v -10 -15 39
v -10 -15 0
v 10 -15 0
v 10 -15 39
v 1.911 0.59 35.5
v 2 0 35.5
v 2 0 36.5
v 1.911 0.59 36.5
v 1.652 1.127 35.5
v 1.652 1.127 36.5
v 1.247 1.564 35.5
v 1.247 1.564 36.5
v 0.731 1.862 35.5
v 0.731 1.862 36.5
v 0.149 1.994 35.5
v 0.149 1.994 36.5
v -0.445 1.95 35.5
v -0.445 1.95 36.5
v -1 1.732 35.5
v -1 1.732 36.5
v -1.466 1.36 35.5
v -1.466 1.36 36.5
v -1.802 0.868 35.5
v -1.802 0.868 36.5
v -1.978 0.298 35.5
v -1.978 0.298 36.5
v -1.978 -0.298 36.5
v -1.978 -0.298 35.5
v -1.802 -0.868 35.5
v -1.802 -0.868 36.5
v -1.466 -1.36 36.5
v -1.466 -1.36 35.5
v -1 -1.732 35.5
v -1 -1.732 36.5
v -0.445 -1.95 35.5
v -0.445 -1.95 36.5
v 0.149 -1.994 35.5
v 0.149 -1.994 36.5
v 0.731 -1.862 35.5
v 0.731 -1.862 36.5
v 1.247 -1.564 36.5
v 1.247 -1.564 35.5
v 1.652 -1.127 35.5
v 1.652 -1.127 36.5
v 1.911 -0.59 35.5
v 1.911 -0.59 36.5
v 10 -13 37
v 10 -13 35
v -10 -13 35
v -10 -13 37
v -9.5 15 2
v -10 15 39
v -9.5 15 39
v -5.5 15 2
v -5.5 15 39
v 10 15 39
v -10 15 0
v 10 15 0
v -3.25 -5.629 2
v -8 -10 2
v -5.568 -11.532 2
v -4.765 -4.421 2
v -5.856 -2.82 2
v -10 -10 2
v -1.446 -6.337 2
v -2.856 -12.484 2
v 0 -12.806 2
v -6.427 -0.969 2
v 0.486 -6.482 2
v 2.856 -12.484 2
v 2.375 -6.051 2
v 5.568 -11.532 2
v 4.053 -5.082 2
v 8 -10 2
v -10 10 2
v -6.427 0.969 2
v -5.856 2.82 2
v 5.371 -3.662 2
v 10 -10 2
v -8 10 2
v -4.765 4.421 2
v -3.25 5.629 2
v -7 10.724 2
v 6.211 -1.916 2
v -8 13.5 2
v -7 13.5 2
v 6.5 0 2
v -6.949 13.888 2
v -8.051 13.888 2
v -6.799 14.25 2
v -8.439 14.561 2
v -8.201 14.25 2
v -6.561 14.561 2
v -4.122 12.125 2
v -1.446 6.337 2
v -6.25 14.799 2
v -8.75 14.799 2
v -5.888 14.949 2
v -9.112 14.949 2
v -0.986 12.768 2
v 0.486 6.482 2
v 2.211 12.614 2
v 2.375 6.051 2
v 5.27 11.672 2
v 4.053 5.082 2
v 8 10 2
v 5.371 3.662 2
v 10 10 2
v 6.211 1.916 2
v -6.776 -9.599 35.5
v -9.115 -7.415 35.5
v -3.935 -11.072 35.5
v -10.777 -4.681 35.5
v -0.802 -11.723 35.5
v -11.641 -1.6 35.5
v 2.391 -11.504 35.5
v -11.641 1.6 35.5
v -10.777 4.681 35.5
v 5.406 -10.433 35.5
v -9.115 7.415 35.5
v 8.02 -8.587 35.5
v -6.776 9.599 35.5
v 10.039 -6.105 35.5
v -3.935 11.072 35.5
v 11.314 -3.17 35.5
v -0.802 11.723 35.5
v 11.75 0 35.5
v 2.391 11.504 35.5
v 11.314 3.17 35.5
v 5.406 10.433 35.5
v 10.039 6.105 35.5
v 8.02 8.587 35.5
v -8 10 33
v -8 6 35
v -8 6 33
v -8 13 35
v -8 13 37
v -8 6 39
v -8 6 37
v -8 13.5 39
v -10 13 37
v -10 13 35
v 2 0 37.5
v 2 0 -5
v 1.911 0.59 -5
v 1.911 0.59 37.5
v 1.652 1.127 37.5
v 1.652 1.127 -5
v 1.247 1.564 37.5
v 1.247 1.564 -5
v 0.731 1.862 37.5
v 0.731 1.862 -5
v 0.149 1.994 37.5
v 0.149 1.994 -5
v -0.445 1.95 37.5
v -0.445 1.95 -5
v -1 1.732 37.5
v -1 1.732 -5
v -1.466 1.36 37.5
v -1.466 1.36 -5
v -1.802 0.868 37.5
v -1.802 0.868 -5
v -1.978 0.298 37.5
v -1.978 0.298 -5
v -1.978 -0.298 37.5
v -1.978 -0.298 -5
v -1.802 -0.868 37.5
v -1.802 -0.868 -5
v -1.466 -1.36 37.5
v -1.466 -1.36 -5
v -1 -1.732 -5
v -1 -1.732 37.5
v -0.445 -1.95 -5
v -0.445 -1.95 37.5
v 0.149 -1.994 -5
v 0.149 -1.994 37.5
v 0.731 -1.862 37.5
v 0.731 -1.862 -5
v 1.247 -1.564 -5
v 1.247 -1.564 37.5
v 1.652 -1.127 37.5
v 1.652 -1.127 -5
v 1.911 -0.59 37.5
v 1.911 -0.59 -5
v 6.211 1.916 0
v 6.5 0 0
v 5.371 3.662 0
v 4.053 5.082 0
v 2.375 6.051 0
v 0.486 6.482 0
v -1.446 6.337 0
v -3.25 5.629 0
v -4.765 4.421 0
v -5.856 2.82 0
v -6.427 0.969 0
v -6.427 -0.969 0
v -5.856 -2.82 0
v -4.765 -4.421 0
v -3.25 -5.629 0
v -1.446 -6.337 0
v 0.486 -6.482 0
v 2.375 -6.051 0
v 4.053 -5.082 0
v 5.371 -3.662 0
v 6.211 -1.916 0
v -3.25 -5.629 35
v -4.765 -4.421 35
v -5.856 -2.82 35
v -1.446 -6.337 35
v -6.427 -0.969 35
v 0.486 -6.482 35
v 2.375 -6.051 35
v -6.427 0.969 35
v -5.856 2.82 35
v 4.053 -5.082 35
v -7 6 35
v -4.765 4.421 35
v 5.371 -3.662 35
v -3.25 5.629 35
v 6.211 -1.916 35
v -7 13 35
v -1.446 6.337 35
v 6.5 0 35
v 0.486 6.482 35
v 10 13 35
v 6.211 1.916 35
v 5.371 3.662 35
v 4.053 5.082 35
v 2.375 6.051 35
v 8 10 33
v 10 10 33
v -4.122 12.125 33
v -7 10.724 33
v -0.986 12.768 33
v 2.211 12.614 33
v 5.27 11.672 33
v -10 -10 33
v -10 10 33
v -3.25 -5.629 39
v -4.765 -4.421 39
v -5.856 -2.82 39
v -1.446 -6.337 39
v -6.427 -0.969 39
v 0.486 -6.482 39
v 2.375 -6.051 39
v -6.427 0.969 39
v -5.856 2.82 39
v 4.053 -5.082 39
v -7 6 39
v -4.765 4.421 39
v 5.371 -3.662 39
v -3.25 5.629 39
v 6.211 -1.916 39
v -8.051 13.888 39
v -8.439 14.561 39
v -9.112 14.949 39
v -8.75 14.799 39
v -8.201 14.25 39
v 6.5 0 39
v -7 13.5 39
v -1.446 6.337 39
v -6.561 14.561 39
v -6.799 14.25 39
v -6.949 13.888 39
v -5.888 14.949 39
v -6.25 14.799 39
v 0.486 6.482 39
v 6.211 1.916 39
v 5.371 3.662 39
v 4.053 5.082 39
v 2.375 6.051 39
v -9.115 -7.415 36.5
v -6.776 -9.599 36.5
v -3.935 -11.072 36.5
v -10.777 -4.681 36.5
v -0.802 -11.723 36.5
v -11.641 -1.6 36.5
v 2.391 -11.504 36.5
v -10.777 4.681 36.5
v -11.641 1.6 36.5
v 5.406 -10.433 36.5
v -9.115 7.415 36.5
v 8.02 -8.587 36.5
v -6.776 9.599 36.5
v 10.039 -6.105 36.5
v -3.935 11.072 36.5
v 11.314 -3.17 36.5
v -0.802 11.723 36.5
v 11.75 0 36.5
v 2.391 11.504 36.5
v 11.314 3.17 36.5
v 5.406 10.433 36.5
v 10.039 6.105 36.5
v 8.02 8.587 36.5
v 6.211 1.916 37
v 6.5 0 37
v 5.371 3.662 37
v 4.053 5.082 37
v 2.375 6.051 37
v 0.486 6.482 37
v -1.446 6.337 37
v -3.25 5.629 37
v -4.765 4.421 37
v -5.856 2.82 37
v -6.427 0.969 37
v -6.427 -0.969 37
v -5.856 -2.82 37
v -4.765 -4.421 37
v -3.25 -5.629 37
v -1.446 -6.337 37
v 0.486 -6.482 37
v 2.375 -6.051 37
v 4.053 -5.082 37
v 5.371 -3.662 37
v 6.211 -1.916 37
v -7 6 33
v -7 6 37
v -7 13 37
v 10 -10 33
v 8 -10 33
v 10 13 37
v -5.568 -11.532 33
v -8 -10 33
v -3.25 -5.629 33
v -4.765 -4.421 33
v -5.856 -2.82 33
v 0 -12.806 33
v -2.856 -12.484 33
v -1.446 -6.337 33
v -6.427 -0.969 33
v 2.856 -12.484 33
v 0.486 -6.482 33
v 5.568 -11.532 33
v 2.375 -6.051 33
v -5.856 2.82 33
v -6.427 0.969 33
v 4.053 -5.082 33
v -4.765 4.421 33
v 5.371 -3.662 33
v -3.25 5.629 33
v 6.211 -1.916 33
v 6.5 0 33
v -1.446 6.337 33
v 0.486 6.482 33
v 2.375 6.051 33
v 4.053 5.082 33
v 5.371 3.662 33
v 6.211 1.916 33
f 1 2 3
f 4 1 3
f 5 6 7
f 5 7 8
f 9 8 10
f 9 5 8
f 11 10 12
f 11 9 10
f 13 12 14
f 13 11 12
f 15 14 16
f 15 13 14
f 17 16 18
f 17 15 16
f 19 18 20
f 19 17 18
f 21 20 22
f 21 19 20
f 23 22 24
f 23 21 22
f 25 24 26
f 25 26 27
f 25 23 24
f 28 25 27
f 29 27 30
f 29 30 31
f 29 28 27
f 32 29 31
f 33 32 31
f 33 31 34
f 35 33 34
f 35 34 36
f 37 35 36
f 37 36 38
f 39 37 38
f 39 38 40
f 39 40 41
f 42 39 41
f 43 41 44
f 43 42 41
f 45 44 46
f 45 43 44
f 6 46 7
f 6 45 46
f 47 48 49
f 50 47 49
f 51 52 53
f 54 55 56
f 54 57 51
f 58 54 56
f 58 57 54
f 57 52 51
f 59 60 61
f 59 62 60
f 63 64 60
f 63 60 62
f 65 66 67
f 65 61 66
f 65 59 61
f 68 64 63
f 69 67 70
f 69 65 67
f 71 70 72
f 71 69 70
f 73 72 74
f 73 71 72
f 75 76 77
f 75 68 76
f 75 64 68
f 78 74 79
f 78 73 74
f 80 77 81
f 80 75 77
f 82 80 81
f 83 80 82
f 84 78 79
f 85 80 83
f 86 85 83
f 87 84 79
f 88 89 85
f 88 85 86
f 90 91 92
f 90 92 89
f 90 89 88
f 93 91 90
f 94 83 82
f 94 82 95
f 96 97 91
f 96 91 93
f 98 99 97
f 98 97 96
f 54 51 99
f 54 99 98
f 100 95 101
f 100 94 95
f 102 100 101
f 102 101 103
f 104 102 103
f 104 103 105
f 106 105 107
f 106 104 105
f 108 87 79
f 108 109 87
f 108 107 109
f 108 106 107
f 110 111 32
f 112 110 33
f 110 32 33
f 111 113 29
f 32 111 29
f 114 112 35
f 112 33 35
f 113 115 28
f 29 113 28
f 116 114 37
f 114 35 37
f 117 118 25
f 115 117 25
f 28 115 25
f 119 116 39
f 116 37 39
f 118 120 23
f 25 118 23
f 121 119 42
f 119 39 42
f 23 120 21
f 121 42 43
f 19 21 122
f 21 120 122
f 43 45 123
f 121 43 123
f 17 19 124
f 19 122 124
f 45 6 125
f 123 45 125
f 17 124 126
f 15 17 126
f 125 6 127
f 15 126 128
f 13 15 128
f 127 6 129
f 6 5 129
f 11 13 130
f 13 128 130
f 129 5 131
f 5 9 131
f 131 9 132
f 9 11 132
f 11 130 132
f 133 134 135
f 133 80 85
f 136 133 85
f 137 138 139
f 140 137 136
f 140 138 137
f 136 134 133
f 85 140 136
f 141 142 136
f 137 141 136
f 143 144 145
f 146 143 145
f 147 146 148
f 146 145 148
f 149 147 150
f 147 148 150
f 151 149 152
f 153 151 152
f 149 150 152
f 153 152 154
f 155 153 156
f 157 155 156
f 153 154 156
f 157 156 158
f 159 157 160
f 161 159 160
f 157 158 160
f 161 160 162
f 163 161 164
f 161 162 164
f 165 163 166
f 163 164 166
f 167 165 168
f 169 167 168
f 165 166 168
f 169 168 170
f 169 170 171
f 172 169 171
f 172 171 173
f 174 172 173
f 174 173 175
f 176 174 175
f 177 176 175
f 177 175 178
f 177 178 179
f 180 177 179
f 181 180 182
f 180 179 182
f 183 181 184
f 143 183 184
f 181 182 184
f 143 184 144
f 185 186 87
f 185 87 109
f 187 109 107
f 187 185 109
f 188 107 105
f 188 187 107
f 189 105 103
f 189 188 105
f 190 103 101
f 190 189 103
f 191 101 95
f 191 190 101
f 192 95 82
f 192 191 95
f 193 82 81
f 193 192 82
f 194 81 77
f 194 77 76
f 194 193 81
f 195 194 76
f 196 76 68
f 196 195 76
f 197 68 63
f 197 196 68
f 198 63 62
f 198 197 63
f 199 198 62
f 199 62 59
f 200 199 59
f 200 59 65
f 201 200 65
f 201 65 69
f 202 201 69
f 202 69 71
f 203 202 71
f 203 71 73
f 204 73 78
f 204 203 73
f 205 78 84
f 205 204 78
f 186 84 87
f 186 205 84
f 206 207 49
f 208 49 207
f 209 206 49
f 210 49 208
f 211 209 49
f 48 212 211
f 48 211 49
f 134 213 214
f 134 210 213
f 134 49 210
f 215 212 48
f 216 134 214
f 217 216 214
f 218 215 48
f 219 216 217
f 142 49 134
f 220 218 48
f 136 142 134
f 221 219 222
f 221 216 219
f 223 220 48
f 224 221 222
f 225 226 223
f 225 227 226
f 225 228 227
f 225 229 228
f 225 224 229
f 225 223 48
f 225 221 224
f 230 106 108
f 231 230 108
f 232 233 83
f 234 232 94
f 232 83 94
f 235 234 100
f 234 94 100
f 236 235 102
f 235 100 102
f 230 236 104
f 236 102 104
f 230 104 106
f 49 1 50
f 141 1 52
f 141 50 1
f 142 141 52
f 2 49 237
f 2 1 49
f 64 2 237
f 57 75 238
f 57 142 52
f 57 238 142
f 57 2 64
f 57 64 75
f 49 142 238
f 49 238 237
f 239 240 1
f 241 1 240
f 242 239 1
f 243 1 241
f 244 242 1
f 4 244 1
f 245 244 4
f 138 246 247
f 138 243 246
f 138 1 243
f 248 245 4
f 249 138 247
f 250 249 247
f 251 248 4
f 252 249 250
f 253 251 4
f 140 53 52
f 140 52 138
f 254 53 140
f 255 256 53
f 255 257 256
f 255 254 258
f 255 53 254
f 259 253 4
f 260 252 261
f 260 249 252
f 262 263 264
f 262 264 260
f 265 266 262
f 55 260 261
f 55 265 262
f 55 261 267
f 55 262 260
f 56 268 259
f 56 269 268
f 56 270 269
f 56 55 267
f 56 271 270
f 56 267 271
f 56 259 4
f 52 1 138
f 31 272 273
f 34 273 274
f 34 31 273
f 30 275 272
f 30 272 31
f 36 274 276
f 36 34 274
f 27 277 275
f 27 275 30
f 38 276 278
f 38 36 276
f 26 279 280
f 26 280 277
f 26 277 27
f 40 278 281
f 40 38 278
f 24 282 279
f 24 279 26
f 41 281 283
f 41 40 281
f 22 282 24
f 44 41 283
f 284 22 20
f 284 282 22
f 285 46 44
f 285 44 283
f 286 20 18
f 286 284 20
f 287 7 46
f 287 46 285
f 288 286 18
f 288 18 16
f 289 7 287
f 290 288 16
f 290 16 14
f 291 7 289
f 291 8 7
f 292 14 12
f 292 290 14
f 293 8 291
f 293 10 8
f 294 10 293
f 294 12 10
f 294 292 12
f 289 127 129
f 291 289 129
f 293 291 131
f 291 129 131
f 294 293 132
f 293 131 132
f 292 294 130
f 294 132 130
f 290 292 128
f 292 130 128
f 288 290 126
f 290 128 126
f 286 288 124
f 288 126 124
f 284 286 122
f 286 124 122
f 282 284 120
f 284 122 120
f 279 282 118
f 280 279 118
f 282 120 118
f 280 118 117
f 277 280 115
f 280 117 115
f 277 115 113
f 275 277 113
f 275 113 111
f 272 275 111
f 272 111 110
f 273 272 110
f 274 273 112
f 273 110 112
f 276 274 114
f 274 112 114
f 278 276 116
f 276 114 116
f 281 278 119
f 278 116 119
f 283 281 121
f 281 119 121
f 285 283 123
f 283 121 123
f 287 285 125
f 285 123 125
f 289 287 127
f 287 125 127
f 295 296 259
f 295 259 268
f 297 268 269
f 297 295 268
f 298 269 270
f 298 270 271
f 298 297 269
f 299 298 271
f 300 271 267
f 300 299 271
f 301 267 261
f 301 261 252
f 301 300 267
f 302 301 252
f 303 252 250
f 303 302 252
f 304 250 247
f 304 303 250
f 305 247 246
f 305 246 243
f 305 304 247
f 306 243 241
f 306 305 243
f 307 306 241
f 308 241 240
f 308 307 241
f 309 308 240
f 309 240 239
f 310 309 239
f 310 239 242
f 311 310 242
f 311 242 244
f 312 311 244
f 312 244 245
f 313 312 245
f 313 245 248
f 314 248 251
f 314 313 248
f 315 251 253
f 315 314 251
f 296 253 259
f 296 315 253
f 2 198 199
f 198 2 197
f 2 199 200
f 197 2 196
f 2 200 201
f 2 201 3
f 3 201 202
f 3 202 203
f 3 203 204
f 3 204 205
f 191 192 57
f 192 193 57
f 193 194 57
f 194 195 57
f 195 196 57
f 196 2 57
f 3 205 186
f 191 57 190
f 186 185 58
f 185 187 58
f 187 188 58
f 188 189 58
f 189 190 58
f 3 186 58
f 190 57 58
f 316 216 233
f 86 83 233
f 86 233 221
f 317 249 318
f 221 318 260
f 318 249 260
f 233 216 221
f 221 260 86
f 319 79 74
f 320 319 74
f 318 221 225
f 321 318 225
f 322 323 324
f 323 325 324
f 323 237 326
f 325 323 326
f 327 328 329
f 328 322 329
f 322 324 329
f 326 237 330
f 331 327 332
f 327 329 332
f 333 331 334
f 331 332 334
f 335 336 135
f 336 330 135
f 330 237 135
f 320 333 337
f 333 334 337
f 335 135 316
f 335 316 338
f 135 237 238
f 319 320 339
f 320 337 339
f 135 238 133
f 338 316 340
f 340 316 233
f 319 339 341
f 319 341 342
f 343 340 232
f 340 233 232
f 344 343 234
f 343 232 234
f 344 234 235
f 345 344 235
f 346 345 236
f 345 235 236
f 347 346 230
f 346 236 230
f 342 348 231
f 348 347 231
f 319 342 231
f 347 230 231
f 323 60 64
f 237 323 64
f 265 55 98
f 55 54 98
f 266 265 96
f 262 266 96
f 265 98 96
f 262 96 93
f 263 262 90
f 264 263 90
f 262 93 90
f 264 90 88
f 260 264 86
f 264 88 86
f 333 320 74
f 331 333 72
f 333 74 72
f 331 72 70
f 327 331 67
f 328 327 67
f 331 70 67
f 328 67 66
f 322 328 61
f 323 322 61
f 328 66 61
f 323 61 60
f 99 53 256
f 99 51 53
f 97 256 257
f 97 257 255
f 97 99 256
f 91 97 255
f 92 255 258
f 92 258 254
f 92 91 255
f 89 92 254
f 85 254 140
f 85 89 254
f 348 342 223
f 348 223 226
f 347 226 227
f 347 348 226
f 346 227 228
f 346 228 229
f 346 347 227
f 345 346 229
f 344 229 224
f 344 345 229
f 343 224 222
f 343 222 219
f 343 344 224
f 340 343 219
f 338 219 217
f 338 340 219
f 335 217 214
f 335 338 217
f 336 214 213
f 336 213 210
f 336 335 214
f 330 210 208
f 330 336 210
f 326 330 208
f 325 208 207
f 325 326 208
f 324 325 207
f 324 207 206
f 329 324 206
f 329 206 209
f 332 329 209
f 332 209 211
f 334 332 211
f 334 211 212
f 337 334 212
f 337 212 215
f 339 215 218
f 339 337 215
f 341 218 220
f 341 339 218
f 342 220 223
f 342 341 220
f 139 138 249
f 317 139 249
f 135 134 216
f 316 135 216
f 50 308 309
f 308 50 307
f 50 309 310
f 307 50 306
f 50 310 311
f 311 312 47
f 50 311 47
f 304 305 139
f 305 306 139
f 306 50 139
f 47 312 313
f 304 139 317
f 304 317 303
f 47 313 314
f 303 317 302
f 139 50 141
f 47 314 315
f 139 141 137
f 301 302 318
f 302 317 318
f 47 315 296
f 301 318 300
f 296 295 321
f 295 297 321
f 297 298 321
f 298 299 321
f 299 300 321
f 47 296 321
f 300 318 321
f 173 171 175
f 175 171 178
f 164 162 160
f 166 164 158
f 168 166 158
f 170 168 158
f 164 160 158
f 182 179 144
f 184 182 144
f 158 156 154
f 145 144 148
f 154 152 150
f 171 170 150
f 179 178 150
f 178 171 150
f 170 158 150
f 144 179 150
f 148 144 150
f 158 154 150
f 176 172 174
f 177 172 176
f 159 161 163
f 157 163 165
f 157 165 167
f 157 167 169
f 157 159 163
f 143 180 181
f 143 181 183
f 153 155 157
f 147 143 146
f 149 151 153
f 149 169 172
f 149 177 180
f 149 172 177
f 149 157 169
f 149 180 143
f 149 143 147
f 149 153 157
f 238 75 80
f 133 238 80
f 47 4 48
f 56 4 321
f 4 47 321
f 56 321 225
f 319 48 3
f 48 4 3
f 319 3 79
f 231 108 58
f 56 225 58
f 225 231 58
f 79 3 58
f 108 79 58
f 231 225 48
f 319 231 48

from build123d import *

# Parameters (mm, degrees)
SKETCH1_W               = 20
SKETCH1_H               = 30
SKETCH1_R               = 6.5
BOSS_EXTRUDE1_DEPTH     = 2
BOSS_EXTRUDE4_DEPTH     = 34
BOSS_EXTRUDE5_START     = 37
SKETCH1_9_W             = 20
SKETCH1_9_H             = 30
SKETCH1_9_R             = 6.5
BOSS_EXTRUDE5_DEPTH     = 2
BOSS_EXTRUDE6_START     = 33
BOSS_EXTRUDE6_OUTLINE_W = 20
BOSS_EXTRUDE6_OUTLINE_H = 30
BOSS_EXTRUDE6_OUTLINE_R = 6.5
BOSS_EXTRUDE6_DEPTH     = 2
BOSS_EXTRUDE7_DEPTH     = 39
SKETCH2_W               = 1
SKETCH2_H               = 9
CUT_EXTRUDE1_DEPTH      = 37
FILLET2_R               = 1.5
BOSS_EXTRUDE8_START     = 35.5
SKETCH4_R               = 11.75
SKETCH4_R_2             = 2
BOSS_EXTRUDE8_DEPTH     = 1
BOSS_EXTRUDE9_START     = -5
BOSS_EXTRUDE9_OUTLINE_R = 2
BOSS_EXTRUDE9_DEPTH     = 42.5


# Read off the part's stored shape, not the designer's step: Boss-Extrude6, Boss-Extrude9
with BuildPart() as part:
    # Sketch1 → Boss-Extrude1 (new body)
    with BuildSketch(Plane.XY):
        Rectangle(SKETCH1_W, SKETCH1_H)
        Circle(SKETCH1_R, mode=Mode.SUBTRACT)
    extrude(amount=BOSS_EXTRUDE1_DEPTH)

    # Sketch1<7> → Boss-Extrude4 (add)
    with BuildSketch(Plane.XY):
        with BuildLine():
            Line((10, 15), (-10, 15))
            Line((-10, 15), (-10, 10))
            Line((-10, 10), (-8, 10))
            ThreePointArc((-8, 10), (0, 12.806248475), (8, 10))
            Line((8, 10), (10, 10))
            Line((10, 10), (10, 15))
        make_face()
        with BuildLine():
            Line((10, -10), (8, -10))
            ThreePointArc((8, -10), (0, -12.806248475), (-8, -10))
            Line((-8, -10), (-10, -10))
            Line((-10, -10), (-10, -15))
            Line((-10, -15), (10, -15))
            Line((10, -15), (10, -10))
        make_face()
    extrude(amount=BOSS_EXTRUDE4_DEPTH)

    # Boss-Extrude6 outline → Boss-Extrude6 (add)
    with BuildSketch(Plane.XY.offset(BOSS_EXTRUDE6_START)):
        Rectangle(BOSS_EXTRUDE6_OUTLINE_W, BOSS_EXTRUDE6_OUTLINE_H)
        Circle(BOSS_EXTRUDE6_OUTLINE_R, mode=Mode.SUBTRACT)
    extrude(amount=BOSS_EXTRUDE6_DEPTH)



with BuildPart() as body_2:
    # Sketch1<9> → Boss-Extrude5 (new body)
    with BuildSketch(Plane.XY.offset(BOSS_EXTRUDE5_START)):
        Rectangle(SKETCH1_9_W, SKETCH1_9_H)
        Circle(SKETCH1_9_R, mode=Mode.SUBTRACT)
    extrude(amount=BOSS_EXTRUDE5_DEPTH)


with BuildPart() as part_1:
    add(part.part)

    add(body_2.part)  # Boss-Extrude7 merges body 2
    # Sketch1<11> → Boss-Extrude7 (add)
    with BuildSketch(Plane.XY):
        Polygon((10, 13), (10, 15), (-10, 15), (-10, 13), (-8, 13), (8, 13), align=None)
        Polygon((10, -15), (10, -13), (8, -13), (-8, -13), (-10, -13), (-10, -15), align=None)
    extrude(amount=BOSS_EXTRUDE7_DEPTH)

    # Sketch2 → Cut-Extrude1 (cut)
    with BuildSketch(Plane.XY.offset(39)):
        with Locations((-7.5, 10.5)):
            Rectangle(SKETCH2_W, SKETCH2_H)
    extrude(amount=-CUT_EXTRUDE1_DEPTH, mode=Mode.SUBTRACT)

    # Fillet2
    fillet2_edges = [part_1.edges().sort_by_distance(p)[0] for p in [
        (-7, 15, 20.5),
        (-8, 15, 20.5),
    ]]
    fillet(fillet2_edges, radius=FILLET2_R)


with BuildPart() as body_2_2:
    # Sketch4 → Boss-Extrude8 (new body)
    with BuildSketch(Plane.XY.offset(BOSS_EXTRUDE8_START)):
        Circle(SKETCH4_R)
        Circle(SKETCH4_R_2, mode=Mode.SUBTRACT)
    extrude(amount=BOSS_EXTRUDE8_DEPTH)


with BuildPart() as body_3:
    # Boss-Extrude9 outline → Boss-Extrude9 (new body)
    with BuildSketch(Plane.XY.offset(BOSS_EXTRUDE9_START)):
        Circle(BOSS_EXTRUDE9_OUTLINE_R)
    extrude(amount=BOSS_EXTRUDE9_DEPTH)


solid = Compound([part_1.part, body_2_2.part, body_3.part])
